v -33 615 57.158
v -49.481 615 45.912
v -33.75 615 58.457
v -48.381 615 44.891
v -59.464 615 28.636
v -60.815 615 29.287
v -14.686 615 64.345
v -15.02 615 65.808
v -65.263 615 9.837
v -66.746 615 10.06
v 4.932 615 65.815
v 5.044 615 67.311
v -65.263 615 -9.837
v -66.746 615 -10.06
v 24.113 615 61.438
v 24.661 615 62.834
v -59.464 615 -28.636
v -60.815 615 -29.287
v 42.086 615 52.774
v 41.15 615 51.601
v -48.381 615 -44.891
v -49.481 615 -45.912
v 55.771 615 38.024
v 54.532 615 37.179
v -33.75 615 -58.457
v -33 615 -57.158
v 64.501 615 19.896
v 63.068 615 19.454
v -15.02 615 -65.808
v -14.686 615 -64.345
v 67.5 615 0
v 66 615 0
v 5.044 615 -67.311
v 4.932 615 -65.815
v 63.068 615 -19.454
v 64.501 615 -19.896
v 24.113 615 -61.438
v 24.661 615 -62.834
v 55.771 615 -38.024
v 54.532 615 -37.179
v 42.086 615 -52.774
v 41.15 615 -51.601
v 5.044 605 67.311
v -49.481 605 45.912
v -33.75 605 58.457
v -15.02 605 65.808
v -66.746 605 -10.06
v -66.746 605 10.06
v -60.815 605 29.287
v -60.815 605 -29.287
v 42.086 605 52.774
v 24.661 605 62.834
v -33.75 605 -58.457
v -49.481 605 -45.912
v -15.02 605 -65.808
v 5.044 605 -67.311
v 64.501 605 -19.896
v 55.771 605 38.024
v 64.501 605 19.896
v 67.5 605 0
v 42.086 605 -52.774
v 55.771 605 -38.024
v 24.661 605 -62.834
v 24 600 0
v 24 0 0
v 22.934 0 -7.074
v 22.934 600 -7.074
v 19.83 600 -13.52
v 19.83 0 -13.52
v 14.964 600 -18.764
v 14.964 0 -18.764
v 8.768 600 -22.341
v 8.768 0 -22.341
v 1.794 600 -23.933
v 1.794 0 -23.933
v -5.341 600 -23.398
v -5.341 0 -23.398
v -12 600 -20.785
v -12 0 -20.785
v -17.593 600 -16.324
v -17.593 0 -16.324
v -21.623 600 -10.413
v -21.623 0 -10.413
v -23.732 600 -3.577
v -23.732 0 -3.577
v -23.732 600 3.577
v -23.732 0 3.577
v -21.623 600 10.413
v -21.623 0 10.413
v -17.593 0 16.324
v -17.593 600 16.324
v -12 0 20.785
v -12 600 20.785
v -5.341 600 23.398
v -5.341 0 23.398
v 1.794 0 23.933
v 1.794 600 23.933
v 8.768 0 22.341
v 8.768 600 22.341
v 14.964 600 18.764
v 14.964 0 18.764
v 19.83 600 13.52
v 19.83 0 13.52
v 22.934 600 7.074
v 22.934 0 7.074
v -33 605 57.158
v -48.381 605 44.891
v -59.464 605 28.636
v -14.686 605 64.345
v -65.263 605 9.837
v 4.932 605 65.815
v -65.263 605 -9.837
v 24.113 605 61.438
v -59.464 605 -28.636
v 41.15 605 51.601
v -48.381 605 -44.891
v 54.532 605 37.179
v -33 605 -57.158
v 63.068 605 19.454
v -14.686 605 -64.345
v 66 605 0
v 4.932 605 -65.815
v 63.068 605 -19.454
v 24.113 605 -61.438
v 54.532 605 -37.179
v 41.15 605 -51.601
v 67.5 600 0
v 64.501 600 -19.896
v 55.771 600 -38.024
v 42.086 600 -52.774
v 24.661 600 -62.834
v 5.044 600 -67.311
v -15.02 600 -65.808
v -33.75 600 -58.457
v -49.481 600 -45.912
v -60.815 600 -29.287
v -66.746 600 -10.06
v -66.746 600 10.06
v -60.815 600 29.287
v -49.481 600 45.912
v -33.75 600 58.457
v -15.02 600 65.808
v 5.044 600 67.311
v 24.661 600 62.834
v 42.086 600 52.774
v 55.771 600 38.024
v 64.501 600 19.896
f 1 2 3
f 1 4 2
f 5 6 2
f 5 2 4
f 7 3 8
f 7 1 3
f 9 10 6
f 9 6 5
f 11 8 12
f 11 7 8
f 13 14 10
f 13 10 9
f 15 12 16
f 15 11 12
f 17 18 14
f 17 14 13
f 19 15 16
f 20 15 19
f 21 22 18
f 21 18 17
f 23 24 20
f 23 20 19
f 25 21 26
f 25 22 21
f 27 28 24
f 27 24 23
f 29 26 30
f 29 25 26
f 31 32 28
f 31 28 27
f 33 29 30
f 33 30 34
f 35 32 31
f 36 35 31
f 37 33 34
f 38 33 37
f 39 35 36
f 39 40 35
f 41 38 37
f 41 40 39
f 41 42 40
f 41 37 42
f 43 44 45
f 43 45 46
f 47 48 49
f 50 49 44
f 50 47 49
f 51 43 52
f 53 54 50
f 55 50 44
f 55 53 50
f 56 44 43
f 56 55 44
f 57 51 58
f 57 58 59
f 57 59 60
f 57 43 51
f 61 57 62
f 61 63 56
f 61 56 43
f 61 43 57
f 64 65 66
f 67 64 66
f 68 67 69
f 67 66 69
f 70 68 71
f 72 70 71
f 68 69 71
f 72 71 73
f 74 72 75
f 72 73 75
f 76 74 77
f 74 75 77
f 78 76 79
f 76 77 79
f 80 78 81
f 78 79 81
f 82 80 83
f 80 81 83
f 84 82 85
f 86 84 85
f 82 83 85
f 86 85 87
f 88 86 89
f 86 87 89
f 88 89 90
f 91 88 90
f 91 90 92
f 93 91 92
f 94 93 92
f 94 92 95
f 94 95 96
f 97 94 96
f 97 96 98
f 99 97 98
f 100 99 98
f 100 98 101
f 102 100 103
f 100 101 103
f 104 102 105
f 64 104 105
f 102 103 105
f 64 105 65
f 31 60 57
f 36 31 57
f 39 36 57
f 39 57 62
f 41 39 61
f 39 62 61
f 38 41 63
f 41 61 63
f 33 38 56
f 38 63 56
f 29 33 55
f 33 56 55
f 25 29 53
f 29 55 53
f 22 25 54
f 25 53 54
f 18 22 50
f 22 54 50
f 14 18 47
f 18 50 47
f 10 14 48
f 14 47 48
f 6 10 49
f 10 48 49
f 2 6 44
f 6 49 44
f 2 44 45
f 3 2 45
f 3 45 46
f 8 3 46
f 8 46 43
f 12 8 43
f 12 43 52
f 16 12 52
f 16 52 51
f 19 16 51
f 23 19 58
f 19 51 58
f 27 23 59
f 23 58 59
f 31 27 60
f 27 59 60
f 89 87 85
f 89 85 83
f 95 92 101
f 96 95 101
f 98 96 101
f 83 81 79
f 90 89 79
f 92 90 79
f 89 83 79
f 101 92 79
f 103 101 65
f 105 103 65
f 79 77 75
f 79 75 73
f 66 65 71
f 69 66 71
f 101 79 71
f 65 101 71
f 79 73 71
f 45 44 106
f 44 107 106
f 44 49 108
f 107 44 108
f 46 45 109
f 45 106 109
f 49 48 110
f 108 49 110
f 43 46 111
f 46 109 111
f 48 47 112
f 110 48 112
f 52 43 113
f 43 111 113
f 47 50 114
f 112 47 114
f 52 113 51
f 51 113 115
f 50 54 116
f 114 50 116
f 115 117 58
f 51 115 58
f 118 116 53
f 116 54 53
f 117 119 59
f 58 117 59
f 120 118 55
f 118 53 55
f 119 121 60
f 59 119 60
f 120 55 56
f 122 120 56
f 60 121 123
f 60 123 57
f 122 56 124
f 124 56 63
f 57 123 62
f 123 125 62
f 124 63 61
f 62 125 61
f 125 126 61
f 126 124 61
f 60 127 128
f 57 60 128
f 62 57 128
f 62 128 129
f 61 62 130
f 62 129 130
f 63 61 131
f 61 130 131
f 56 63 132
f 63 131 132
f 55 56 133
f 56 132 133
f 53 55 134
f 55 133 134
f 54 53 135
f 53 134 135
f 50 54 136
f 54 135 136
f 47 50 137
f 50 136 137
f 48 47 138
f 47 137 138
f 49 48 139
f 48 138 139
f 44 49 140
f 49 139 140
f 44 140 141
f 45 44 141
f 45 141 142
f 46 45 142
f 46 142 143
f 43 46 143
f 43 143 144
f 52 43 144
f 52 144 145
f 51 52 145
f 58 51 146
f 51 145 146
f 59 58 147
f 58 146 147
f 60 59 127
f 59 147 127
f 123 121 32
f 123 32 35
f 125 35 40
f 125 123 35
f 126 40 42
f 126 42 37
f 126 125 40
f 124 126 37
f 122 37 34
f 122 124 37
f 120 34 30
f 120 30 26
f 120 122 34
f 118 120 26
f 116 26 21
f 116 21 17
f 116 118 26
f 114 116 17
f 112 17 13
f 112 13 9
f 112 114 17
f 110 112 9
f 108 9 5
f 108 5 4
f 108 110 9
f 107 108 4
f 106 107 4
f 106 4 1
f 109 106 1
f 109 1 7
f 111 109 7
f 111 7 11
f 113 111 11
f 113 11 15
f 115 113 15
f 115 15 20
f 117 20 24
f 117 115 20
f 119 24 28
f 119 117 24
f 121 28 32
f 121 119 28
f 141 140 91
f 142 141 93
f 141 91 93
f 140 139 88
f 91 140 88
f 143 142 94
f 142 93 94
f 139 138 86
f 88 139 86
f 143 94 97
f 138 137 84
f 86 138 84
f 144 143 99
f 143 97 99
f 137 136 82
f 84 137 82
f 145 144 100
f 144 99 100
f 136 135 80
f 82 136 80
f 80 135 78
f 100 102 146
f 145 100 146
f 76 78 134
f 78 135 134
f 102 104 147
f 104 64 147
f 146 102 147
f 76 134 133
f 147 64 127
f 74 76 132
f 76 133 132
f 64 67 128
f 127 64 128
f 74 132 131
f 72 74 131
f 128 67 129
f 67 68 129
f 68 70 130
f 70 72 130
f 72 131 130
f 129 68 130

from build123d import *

# Parameters (mm, degrees)
SKETCH1_R           = 24
BOSS_EXTRUDE1_DEPTH = 600
SKETCH7_R           = 67.5
BOSS_EXTRUDE5_DEPTH = 5
SKETCH6_R           = 67.5
SKETCH6_R_2         = 66
BOSS_EXTRUDE4_DEPTH = 10


with BuildPart() as part:
    # Sketch1 → Boss-Extrude1 (new body)
    with BuildSketch(Plane(origin=(0, 0, 0), x_dir=(1, 0, 0), z_dir=(0, 1, 0))):
        Circle(SKETCH1_R)
    extrude(amount=BOSS_EXTRUDE1_DEPTH)

    # Sketch7 → Boss-Extrude5 (add)
    with BuildSketch(Plane(origin=(0, 600, 0), x_dir=(1, 0, 0), z_dir=(0, 1, 0))):
        Circle(SKETCH7_R)
    extrude(amount=BOSS_EXTRUDE5_DEPTH)


with BuildPart() as body_2:
    # Sketch6 → Boss-Extrude4 (new body)
    with BuildSketch(Plane(origin=(0, 605, 0), x_dir=(1, 0, 0), z_dir=(0, 1, 0))):
        Circle(SKETCH6_R)
        Circle(SKETCH6_R_2, mode=Mode.SUBTRACT)
    extrude(amount=BOSS_EXTRUDE4_DEPTH)


solid = Compound([part.part, body_2.part])
